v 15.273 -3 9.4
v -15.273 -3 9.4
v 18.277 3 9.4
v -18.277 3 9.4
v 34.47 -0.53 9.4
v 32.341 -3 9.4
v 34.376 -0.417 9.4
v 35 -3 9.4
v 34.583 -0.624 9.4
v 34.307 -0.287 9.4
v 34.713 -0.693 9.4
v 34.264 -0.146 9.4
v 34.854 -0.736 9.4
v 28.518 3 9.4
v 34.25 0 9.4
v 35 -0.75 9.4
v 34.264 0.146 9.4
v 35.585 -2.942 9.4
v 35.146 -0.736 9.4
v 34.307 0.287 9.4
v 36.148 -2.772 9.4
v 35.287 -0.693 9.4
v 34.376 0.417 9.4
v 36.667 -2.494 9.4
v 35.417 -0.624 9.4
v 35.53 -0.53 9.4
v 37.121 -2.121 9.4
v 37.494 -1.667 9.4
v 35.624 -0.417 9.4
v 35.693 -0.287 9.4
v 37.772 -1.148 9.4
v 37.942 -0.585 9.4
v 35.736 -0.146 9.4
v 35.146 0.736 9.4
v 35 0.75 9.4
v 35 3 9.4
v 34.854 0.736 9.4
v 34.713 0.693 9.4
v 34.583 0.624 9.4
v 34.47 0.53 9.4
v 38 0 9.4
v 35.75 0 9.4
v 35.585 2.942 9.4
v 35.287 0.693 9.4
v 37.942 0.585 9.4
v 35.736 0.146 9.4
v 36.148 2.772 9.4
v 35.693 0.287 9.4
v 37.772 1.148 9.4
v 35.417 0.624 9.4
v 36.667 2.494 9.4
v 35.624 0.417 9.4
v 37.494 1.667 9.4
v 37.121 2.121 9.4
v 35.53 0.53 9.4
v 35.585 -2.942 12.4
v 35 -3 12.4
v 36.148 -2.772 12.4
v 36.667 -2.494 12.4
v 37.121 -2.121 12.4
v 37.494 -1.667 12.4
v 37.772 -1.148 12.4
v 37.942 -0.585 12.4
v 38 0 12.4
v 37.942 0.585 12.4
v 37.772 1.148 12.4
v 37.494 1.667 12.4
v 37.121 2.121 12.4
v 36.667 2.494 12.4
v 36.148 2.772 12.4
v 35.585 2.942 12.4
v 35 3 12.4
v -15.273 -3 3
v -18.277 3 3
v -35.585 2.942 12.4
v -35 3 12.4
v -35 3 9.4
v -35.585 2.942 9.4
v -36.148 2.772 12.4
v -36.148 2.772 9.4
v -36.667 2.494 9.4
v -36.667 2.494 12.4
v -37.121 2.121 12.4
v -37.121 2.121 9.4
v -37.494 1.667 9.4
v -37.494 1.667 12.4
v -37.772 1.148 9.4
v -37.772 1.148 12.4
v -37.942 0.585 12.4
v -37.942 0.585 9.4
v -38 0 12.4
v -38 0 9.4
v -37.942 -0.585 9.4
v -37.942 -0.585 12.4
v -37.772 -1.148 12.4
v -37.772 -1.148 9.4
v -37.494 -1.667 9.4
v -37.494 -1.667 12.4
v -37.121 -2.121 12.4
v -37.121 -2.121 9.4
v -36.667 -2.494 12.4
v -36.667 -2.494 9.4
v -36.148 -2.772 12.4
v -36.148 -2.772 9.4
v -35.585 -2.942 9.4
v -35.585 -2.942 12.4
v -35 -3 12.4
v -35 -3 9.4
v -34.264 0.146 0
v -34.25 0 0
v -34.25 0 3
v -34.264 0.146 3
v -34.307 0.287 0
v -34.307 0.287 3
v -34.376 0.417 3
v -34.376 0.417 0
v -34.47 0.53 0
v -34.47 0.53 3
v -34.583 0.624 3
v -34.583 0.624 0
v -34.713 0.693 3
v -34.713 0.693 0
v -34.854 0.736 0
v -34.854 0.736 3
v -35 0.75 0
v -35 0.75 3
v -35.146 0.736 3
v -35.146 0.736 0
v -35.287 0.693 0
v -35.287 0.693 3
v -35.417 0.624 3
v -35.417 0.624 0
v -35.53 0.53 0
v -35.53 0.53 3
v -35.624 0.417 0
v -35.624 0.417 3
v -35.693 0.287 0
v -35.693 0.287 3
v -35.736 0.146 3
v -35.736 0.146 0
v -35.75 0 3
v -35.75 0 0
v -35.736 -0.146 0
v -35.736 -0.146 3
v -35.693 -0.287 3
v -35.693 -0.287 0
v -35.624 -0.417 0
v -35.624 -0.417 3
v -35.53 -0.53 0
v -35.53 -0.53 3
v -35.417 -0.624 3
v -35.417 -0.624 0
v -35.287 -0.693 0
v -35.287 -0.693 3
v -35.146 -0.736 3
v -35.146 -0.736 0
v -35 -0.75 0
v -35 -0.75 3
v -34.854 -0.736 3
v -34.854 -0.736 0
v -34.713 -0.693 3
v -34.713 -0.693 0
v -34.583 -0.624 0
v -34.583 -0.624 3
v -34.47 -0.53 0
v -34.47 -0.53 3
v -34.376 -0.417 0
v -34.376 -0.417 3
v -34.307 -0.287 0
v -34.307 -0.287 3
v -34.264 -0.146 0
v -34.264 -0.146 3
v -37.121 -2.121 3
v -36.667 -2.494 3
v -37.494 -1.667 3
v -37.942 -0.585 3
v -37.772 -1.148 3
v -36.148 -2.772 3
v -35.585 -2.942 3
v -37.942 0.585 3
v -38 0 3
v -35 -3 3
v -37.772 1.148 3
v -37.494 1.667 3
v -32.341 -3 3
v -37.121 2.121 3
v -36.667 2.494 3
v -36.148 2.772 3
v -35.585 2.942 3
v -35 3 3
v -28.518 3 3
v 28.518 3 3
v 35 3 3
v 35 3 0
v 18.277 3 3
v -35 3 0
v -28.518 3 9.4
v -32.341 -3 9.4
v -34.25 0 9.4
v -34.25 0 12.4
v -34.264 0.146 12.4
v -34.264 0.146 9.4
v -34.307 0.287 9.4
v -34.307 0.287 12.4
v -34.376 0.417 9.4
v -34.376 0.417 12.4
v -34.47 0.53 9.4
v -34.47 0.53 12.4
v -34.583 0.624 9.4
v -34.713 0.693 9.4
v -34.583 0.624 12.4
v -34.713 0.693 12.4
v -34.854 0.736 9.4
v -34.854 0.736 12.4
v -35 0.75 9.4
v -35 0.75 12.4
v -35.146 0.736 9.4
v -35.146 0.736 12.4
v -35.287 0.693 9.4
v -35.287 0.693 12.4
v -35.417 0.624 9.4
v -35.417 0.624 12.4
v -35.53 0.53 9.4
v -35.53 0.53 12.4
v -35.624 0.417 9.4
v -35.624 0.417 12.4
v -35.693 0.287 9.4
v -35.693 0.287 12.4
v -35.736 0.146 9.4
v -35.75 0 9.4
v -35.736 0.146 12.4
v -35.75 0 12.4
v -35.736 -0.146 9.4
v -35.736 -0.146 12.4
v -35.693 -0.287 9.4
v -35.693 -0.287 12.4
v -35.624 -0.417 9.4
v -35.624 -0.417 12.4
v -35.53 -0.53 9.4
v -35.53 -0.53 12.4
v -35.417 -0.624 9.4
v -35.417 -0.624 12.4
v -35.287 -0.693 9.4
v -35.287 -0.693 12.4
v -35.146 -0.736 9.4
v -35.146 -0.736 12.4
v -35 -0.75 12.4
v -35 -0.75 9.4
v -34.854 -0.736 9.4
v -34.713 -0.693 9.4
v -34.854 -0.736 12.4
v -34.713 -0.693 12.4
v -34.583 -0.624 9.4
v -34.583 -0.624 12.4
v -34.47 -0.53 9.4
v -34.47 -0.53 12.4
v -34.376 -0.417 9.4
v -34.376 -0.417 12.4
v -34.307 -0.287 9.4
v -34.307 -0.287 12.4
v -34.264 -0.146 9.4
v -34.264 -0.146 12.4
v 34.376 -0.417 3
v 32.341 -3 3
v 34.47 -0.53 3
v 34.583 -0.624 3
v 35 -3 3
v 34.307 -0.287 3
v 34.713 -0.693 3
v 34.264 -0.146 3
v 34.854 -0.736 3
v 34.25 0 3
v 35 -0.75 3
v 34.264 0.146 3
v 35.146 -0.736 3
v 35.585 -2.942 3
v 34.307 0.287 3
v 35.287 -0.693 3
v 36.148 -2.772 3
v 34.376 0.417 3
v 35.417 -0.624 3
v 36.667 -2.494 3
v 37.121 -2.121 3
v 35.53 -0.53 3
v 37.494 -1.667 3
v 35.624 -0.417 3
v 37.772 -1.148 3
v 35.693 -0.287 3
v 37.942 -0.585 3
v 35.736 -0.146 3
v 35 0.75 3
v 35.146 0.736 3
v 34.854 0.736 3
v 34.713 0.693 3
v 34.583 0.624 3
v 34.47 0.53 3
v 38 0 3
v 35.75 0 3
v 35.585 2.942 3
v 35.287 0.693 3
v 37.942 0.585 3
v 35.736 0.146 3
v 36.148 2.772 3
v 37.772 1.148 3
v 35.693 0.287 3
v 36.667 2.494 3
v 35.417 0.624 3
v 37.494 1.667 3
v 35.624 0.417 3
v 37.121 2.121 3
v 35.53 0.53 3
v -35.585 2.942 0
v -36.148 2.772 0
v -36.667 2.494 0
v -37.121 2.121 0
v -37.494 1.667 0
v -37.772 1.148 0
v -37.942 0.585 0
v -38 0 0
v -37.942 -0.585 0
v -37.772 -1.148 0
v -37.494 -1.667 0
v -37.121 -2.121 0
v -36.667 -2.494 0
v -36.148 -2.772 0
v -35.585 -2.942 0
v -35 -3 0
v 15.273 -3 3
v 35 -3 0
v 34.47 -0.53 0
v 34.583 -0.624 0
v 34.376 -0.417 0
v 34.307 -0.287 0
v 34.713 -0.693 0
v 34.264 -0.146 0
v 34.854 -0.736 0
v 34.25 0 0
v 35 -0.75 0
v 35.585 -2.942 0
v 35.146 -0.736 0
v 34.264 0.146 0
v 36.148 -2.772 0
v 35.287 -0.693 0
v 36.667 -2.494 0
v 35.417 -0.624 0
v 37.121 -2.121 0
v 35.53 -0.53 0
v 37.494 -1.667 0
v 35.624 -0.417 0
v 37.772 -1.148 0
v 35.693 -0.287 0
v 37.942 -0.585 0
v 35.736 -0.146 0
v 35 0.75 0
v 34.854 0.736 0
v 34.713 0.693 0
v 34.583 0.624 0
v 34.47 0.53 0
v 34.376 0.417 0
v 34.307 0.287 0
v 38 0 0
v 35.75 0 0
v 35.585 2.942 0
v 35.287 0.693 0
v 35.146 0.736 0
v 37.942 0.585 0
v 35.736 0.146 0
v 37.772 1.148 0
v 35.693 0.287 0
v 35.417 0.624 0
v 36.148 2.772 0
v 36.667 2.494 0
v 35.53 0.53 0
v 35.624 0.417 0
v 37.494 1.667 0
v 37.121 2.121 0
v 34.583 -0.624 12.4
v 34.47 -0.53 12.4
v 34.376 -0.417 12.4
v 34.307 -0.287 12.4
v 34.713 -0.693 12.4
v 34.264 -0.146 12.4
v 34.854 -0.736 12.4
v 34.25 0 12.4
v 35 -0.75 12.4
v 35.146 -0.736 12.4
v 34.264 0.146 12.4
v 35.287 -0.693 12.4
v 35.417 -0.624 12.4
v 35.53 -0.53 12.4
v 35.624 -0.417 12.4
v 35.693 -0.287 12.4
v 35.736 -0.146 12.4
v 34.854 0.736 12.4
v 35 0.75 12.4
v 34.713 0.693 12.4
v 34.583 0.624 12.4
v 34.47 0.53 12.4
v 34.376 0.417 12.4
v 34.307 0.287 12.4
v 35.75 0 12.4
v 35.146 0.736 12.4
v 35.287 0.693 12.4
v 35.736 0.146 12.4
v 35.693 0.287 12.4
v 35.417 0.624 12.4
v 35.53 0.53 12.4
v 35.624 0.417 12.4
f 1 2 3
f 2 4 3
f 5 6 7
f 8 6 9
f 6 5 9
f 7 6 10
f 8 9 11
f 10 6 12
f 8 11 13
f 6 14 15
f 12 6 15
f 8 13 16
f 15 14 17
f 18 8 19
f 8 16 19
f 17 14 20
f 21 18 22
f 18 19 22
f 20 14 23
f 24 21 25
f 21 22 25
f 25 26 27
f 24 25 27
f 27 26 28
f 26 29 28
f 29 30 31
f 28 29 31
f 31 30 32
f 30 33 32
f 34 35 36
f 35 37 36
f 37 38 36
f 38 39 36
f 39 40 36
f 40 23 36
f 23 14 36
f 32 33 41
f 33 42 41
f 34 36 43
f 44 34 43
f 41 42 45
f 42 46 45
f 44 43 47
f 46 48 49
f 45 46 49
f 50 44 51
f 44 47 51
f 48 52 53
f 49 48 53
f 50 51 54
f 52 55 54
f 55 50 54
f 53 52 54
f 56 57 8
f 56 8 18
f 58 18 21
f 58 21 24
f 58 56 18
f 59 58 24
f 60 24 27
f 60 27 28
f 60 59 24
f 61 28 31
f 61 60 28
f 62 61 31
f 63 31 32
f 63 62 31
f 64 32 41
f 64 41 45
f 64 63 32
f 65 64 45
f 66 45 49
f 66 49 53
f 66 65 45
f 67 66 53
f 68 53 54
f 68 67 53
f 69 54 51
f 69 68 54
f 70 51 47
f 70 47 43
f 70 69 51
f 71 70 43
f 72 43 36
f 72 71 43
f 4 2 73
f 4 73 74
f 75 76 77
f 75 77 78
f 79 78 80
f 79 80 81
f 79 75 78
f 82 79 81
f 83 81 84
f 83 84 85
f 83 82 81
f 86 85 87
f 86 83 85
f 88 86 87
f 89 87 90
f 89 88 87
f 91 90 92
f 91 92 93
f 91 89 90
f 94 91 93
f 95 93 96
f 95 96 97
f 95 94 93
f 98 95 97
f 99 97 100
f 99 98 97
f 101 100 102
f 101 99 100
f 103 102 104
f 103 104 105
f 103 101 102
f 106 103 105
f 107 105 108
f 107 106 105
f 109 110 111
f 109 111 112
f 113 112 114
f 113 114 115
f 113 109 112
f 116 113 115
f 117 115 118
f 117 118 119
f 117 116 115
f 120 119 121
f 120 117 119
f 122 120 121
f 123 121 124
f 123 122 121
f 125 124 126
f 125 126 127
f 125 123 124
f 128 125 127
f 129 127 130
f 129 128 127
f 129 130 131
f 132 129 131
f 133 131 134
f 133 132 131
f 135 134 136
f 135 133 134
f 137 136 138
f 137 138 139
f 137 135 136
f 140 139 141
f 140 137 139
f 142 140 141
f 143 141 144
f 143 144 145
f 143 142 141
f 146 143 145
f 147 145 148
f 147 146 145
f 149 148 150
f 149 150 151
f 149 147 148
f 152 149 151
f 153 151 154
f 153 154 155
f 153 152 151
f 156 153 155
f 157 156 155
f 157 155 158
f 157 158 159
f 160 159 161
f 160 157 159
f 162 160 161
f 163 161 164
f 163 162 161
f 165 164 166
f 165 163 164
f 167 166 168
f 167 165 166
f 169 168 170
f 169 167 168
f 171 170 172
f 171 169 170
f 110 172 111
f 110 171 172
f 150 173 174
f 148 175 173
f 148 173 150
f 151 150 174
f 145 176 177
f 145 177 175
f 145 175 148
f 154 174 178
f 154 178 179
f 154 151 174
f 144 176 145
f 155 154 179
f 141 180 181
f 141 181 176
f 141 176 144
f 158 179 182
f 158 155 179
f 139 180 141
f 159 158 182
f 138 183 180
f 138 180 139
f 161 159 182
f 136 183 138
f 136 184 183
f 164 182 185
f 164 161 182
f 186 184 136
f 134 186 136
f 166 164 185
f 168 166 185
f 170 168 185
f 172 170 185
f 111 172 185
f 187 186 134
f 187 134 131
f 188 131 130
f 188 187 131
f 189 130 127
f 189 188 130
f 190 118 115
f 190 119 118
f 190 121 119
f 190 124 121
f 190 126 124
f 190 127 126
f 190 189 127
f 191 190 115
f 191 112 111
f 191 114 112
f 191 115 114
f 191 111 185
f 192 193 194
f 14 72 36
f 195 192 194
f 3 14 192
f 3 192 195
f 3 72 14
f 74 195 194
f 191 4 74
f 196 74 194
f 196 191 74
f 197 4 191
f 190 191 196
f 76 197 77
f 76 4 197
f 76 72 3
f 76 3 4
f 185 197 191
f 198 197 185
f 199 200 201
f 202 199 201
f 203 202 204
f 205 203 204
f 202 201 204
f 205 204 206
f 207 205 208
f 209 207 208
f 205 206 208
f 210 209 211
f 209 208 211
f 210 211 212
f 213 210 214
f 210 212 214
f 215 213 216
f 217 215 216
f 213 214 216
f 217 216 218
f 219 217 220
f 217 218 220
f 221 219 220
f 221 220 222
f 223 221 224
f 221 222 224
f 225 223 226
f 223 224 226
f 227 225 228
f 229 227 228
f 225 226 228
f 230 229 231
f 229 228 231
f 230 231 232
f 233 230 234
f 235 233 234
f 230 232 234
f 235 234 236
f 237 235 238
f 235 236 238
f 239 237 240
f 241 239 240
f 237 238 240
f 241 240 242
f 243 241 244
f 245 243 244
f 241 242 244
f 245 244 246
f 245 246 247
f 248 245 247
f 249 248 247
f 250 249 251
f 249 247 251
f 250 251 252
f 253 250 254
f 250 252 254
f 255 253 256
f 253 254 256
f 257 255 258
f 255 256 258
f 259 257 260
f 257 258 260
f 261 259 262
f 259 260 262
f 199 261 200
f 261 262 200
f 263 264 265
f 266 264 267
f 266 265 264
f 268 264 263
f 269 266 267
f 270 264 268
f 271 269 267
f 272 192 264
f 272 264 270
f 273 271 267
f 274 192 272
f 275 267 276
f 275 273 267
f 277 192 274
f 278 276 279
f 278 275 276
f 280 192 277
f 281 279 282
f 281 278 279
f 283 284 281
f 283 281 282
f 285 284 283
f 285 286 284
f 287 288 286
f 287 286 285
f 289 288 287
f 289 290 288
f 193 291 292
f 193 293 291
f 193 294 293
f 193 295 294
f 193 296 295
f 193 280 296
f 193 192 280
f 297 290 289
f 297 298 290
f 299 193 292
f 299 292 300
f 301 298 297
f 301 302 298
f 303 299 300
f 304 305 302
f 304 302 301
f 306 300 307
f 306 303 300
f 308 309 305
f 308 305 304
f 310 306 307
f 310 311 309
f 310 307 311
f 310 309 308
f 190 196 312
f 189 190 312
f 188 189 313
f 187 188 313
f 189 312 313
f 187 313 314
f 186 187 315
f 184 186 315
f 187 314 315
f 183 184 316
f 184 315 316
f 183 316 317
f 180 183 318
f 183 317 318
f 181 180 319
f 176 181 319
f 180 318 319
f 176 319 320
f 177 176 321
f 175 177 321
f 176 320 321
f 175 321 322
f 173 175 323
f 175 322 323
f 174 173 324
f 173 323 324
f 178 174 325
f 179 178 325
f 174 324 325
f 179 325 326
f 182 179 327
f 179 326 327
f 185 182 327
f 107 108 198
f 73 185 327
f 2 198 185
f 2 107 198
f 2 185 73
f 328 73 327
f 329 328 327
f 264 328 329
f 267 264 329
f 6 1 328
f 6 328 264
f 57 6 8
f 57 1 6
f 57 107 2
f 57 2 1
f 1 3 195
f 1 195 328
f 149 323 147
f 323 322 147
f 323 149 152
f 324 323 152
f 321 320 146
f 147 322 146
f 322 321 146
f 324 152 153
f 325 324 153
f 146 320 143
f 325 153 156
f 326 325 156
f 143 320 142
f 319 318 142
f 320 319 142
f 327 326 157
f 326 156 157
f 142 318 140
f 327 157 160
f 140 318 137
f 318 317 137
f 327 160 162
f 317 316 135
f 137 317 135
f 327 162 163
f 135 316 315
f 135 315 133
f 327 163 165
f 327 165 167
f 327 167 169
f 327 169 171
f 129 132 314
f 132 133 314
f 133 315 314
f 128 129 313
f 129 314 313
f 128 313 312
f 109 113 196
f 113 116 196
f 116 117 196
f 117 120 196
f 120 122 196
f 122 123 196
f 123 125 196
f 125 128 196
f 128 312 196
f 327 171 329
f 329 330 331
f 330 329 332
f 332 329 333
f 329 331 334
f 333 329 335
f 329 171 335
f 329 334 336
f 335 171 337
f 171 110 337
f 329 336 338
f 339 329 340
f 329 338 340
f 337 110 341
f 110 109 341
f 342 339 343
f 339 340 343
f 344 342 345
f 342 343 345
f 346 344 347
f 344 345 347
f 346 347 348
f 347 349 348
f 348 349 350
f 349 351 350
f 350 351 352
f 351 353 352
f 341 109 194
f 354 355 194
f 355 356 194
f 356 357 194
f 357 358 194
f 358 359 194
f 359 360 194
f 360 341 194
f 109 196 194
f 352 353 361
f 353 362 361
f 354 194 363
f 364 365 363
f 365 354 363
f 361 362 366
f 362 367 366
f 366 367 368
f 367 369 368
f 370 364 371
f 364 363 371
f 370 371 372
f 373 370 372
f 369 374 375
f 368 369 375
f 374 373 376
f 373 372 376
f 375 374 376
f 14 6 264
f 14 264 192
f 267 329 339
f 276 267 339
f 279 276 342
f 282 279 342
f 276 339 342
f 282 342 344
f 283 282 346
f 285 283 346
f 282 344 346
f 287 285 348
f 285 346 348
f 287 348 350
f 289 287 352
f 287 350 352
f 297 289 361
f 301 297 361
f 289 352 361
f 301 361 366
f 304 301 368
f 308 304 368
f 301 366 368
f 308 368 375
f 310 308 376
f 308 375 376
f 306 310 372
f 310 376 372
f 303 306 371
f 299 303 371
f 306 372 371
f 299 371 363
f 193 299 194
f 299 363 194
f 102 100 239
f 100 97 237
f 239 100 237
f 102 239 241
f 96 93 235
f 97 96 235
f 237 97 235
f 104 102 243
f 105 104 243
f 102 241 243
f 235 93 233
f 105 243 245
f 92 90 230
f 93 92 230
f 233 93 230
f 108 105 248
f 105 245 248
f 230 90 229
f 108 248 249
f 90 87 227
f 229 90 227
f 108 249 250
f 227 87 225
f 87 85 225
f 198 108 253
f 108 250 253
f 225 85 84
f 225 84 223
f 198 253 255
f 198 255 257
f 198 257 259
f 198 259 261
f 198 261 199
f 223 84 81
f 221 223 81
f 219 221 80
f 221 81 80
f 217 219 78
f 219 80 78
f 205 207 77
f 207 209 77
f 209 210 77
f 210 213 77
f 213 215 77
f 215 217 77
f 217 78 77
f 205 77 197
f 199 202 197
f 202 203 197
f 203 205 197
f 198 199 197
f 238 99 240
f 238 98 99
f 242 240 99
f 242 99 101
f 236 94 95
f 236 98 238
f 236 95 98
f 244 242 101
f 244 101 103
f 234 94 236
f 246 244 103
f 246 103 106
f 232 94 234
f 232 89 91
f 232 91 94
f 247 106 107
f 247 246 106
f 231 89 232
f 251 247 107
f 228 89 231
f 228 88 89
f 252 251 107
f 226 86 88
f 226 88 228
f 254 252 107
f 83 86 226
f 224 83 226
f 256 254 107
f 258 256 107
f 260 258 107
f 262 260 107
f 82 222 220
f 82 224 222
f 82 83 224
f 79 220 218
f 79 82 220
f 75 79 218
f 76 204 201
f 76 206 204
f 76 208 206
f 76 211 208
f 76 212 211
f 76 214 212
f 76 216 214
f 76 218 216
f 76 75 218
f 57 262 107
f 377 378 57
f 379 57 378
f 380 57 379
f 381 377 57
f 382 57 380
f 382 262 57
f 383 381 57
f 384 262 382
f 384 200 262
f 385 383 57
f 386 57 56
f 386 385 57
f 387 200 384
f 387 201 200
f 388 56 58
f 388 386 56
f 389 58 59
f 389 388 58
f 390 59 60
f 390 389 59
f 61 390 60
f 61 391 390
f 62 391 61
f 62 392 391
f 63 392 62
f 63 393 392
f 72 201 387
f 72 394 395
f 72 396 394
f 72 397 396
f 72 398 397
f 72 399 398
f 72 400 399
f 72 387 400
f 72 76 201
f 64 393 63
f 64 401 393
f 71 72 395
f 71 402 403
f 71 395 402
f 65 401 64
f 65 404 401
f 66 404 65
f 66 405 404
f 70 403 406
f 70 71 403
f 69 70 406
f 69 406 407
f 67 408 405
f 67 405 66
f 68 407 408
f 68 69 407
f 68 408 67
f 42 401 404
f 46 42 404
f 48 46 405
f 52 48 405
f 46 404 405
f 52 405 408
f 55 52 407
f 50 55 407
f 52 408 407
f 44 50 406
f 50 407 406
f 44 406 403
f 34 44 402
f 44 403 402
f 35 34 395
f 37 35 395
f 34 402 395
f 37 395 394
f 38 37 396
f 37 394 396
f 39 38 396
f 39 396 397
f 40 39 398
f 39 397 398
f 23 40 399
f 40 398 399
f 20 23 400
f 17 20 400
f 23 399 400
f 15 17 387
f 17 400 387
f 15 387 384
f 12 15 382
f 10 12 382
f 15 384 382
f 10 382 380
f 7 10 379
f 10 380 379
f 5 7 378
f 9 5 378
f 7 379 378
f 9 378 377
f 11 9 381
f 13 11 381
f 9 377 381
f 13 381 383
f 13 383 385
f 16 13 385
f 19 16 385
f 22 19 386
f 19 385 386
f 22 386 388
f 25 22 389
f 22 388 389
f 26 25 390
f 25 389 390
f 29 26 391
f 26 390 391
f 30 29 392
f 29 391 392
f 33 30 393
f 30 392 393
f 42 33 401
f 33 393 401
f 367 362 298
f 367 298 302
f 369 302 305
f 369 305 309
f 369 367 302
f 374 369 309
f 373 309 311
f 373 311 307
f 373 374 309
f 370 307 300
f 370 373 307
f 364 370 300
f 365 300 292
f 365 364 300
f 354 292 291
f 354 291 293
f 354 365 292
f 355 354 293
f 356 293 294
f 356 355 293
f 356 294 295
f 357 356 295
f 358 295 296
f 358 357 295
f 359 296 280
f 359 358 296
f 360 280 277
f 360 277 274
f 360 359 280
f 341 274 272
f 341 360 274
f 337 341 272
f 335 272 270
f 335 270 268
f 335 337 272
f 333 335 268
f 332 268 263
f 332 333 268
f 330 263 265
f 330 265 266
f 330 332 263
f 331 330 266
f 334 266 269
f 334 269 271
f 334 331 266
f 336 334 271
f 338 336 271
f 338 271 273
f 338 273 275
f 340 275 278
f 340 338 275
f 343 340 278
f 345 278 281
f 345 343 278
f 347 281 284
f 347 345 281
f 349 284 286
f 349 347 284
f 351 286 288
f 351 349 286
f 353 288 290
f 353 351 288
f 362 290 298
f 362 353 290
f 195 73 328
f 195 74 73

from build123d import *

# Parameters (mm, degrees)
F0_R     = 0.75
F1_DEPTH = 3
F3_DEPTH = 3.2


with BuildPart() as f1:
    # F0 (on Top) → F1 (new body)
    with BuildSketch(Plane.XY):
        with BuildLine():
            ThreePointArc((35, -3), (38, 0), (35, 3))
            Line((35, 3), (-35, 3))
            ThreePointArc((-35, 3), (-38, 0), (-35, -3))
            Line((-35, -3), (35, -3))
        make_face()
        with Locations((-35, 0)):
            Circle(F0_R, mode=Mode.SUBTRACT)
        with Locations((35, 0)):
            Circle(F0_R, mode=Mode.SUBTRACT)
    extrude(amount=F1_DEPTH)

    # F2 (on face) → F3 (join)
    with BuildSketch(Plane.XY.offset(3)):
        Polygon((-28.517587, 3), (-32.340631, -3), (-15.273468, -3), (-18.277289, 3), align=None)
        Polygon((18.277289, 3), (15.273468, -3), (32.340631, -3), (28.517587, 3), align=None)
    extrude(amount=F3_DEPTH)

    # F4: F1 across face


with BuildPart() as f1_1:
    add(f1.part)
    add(f1.part.mirror(Plane(origin=(23.619311, -0.25, 6.2), x_dir=(1, 0, 0), z_dir=(0, 0, 1))))


solid = f1_1.part
